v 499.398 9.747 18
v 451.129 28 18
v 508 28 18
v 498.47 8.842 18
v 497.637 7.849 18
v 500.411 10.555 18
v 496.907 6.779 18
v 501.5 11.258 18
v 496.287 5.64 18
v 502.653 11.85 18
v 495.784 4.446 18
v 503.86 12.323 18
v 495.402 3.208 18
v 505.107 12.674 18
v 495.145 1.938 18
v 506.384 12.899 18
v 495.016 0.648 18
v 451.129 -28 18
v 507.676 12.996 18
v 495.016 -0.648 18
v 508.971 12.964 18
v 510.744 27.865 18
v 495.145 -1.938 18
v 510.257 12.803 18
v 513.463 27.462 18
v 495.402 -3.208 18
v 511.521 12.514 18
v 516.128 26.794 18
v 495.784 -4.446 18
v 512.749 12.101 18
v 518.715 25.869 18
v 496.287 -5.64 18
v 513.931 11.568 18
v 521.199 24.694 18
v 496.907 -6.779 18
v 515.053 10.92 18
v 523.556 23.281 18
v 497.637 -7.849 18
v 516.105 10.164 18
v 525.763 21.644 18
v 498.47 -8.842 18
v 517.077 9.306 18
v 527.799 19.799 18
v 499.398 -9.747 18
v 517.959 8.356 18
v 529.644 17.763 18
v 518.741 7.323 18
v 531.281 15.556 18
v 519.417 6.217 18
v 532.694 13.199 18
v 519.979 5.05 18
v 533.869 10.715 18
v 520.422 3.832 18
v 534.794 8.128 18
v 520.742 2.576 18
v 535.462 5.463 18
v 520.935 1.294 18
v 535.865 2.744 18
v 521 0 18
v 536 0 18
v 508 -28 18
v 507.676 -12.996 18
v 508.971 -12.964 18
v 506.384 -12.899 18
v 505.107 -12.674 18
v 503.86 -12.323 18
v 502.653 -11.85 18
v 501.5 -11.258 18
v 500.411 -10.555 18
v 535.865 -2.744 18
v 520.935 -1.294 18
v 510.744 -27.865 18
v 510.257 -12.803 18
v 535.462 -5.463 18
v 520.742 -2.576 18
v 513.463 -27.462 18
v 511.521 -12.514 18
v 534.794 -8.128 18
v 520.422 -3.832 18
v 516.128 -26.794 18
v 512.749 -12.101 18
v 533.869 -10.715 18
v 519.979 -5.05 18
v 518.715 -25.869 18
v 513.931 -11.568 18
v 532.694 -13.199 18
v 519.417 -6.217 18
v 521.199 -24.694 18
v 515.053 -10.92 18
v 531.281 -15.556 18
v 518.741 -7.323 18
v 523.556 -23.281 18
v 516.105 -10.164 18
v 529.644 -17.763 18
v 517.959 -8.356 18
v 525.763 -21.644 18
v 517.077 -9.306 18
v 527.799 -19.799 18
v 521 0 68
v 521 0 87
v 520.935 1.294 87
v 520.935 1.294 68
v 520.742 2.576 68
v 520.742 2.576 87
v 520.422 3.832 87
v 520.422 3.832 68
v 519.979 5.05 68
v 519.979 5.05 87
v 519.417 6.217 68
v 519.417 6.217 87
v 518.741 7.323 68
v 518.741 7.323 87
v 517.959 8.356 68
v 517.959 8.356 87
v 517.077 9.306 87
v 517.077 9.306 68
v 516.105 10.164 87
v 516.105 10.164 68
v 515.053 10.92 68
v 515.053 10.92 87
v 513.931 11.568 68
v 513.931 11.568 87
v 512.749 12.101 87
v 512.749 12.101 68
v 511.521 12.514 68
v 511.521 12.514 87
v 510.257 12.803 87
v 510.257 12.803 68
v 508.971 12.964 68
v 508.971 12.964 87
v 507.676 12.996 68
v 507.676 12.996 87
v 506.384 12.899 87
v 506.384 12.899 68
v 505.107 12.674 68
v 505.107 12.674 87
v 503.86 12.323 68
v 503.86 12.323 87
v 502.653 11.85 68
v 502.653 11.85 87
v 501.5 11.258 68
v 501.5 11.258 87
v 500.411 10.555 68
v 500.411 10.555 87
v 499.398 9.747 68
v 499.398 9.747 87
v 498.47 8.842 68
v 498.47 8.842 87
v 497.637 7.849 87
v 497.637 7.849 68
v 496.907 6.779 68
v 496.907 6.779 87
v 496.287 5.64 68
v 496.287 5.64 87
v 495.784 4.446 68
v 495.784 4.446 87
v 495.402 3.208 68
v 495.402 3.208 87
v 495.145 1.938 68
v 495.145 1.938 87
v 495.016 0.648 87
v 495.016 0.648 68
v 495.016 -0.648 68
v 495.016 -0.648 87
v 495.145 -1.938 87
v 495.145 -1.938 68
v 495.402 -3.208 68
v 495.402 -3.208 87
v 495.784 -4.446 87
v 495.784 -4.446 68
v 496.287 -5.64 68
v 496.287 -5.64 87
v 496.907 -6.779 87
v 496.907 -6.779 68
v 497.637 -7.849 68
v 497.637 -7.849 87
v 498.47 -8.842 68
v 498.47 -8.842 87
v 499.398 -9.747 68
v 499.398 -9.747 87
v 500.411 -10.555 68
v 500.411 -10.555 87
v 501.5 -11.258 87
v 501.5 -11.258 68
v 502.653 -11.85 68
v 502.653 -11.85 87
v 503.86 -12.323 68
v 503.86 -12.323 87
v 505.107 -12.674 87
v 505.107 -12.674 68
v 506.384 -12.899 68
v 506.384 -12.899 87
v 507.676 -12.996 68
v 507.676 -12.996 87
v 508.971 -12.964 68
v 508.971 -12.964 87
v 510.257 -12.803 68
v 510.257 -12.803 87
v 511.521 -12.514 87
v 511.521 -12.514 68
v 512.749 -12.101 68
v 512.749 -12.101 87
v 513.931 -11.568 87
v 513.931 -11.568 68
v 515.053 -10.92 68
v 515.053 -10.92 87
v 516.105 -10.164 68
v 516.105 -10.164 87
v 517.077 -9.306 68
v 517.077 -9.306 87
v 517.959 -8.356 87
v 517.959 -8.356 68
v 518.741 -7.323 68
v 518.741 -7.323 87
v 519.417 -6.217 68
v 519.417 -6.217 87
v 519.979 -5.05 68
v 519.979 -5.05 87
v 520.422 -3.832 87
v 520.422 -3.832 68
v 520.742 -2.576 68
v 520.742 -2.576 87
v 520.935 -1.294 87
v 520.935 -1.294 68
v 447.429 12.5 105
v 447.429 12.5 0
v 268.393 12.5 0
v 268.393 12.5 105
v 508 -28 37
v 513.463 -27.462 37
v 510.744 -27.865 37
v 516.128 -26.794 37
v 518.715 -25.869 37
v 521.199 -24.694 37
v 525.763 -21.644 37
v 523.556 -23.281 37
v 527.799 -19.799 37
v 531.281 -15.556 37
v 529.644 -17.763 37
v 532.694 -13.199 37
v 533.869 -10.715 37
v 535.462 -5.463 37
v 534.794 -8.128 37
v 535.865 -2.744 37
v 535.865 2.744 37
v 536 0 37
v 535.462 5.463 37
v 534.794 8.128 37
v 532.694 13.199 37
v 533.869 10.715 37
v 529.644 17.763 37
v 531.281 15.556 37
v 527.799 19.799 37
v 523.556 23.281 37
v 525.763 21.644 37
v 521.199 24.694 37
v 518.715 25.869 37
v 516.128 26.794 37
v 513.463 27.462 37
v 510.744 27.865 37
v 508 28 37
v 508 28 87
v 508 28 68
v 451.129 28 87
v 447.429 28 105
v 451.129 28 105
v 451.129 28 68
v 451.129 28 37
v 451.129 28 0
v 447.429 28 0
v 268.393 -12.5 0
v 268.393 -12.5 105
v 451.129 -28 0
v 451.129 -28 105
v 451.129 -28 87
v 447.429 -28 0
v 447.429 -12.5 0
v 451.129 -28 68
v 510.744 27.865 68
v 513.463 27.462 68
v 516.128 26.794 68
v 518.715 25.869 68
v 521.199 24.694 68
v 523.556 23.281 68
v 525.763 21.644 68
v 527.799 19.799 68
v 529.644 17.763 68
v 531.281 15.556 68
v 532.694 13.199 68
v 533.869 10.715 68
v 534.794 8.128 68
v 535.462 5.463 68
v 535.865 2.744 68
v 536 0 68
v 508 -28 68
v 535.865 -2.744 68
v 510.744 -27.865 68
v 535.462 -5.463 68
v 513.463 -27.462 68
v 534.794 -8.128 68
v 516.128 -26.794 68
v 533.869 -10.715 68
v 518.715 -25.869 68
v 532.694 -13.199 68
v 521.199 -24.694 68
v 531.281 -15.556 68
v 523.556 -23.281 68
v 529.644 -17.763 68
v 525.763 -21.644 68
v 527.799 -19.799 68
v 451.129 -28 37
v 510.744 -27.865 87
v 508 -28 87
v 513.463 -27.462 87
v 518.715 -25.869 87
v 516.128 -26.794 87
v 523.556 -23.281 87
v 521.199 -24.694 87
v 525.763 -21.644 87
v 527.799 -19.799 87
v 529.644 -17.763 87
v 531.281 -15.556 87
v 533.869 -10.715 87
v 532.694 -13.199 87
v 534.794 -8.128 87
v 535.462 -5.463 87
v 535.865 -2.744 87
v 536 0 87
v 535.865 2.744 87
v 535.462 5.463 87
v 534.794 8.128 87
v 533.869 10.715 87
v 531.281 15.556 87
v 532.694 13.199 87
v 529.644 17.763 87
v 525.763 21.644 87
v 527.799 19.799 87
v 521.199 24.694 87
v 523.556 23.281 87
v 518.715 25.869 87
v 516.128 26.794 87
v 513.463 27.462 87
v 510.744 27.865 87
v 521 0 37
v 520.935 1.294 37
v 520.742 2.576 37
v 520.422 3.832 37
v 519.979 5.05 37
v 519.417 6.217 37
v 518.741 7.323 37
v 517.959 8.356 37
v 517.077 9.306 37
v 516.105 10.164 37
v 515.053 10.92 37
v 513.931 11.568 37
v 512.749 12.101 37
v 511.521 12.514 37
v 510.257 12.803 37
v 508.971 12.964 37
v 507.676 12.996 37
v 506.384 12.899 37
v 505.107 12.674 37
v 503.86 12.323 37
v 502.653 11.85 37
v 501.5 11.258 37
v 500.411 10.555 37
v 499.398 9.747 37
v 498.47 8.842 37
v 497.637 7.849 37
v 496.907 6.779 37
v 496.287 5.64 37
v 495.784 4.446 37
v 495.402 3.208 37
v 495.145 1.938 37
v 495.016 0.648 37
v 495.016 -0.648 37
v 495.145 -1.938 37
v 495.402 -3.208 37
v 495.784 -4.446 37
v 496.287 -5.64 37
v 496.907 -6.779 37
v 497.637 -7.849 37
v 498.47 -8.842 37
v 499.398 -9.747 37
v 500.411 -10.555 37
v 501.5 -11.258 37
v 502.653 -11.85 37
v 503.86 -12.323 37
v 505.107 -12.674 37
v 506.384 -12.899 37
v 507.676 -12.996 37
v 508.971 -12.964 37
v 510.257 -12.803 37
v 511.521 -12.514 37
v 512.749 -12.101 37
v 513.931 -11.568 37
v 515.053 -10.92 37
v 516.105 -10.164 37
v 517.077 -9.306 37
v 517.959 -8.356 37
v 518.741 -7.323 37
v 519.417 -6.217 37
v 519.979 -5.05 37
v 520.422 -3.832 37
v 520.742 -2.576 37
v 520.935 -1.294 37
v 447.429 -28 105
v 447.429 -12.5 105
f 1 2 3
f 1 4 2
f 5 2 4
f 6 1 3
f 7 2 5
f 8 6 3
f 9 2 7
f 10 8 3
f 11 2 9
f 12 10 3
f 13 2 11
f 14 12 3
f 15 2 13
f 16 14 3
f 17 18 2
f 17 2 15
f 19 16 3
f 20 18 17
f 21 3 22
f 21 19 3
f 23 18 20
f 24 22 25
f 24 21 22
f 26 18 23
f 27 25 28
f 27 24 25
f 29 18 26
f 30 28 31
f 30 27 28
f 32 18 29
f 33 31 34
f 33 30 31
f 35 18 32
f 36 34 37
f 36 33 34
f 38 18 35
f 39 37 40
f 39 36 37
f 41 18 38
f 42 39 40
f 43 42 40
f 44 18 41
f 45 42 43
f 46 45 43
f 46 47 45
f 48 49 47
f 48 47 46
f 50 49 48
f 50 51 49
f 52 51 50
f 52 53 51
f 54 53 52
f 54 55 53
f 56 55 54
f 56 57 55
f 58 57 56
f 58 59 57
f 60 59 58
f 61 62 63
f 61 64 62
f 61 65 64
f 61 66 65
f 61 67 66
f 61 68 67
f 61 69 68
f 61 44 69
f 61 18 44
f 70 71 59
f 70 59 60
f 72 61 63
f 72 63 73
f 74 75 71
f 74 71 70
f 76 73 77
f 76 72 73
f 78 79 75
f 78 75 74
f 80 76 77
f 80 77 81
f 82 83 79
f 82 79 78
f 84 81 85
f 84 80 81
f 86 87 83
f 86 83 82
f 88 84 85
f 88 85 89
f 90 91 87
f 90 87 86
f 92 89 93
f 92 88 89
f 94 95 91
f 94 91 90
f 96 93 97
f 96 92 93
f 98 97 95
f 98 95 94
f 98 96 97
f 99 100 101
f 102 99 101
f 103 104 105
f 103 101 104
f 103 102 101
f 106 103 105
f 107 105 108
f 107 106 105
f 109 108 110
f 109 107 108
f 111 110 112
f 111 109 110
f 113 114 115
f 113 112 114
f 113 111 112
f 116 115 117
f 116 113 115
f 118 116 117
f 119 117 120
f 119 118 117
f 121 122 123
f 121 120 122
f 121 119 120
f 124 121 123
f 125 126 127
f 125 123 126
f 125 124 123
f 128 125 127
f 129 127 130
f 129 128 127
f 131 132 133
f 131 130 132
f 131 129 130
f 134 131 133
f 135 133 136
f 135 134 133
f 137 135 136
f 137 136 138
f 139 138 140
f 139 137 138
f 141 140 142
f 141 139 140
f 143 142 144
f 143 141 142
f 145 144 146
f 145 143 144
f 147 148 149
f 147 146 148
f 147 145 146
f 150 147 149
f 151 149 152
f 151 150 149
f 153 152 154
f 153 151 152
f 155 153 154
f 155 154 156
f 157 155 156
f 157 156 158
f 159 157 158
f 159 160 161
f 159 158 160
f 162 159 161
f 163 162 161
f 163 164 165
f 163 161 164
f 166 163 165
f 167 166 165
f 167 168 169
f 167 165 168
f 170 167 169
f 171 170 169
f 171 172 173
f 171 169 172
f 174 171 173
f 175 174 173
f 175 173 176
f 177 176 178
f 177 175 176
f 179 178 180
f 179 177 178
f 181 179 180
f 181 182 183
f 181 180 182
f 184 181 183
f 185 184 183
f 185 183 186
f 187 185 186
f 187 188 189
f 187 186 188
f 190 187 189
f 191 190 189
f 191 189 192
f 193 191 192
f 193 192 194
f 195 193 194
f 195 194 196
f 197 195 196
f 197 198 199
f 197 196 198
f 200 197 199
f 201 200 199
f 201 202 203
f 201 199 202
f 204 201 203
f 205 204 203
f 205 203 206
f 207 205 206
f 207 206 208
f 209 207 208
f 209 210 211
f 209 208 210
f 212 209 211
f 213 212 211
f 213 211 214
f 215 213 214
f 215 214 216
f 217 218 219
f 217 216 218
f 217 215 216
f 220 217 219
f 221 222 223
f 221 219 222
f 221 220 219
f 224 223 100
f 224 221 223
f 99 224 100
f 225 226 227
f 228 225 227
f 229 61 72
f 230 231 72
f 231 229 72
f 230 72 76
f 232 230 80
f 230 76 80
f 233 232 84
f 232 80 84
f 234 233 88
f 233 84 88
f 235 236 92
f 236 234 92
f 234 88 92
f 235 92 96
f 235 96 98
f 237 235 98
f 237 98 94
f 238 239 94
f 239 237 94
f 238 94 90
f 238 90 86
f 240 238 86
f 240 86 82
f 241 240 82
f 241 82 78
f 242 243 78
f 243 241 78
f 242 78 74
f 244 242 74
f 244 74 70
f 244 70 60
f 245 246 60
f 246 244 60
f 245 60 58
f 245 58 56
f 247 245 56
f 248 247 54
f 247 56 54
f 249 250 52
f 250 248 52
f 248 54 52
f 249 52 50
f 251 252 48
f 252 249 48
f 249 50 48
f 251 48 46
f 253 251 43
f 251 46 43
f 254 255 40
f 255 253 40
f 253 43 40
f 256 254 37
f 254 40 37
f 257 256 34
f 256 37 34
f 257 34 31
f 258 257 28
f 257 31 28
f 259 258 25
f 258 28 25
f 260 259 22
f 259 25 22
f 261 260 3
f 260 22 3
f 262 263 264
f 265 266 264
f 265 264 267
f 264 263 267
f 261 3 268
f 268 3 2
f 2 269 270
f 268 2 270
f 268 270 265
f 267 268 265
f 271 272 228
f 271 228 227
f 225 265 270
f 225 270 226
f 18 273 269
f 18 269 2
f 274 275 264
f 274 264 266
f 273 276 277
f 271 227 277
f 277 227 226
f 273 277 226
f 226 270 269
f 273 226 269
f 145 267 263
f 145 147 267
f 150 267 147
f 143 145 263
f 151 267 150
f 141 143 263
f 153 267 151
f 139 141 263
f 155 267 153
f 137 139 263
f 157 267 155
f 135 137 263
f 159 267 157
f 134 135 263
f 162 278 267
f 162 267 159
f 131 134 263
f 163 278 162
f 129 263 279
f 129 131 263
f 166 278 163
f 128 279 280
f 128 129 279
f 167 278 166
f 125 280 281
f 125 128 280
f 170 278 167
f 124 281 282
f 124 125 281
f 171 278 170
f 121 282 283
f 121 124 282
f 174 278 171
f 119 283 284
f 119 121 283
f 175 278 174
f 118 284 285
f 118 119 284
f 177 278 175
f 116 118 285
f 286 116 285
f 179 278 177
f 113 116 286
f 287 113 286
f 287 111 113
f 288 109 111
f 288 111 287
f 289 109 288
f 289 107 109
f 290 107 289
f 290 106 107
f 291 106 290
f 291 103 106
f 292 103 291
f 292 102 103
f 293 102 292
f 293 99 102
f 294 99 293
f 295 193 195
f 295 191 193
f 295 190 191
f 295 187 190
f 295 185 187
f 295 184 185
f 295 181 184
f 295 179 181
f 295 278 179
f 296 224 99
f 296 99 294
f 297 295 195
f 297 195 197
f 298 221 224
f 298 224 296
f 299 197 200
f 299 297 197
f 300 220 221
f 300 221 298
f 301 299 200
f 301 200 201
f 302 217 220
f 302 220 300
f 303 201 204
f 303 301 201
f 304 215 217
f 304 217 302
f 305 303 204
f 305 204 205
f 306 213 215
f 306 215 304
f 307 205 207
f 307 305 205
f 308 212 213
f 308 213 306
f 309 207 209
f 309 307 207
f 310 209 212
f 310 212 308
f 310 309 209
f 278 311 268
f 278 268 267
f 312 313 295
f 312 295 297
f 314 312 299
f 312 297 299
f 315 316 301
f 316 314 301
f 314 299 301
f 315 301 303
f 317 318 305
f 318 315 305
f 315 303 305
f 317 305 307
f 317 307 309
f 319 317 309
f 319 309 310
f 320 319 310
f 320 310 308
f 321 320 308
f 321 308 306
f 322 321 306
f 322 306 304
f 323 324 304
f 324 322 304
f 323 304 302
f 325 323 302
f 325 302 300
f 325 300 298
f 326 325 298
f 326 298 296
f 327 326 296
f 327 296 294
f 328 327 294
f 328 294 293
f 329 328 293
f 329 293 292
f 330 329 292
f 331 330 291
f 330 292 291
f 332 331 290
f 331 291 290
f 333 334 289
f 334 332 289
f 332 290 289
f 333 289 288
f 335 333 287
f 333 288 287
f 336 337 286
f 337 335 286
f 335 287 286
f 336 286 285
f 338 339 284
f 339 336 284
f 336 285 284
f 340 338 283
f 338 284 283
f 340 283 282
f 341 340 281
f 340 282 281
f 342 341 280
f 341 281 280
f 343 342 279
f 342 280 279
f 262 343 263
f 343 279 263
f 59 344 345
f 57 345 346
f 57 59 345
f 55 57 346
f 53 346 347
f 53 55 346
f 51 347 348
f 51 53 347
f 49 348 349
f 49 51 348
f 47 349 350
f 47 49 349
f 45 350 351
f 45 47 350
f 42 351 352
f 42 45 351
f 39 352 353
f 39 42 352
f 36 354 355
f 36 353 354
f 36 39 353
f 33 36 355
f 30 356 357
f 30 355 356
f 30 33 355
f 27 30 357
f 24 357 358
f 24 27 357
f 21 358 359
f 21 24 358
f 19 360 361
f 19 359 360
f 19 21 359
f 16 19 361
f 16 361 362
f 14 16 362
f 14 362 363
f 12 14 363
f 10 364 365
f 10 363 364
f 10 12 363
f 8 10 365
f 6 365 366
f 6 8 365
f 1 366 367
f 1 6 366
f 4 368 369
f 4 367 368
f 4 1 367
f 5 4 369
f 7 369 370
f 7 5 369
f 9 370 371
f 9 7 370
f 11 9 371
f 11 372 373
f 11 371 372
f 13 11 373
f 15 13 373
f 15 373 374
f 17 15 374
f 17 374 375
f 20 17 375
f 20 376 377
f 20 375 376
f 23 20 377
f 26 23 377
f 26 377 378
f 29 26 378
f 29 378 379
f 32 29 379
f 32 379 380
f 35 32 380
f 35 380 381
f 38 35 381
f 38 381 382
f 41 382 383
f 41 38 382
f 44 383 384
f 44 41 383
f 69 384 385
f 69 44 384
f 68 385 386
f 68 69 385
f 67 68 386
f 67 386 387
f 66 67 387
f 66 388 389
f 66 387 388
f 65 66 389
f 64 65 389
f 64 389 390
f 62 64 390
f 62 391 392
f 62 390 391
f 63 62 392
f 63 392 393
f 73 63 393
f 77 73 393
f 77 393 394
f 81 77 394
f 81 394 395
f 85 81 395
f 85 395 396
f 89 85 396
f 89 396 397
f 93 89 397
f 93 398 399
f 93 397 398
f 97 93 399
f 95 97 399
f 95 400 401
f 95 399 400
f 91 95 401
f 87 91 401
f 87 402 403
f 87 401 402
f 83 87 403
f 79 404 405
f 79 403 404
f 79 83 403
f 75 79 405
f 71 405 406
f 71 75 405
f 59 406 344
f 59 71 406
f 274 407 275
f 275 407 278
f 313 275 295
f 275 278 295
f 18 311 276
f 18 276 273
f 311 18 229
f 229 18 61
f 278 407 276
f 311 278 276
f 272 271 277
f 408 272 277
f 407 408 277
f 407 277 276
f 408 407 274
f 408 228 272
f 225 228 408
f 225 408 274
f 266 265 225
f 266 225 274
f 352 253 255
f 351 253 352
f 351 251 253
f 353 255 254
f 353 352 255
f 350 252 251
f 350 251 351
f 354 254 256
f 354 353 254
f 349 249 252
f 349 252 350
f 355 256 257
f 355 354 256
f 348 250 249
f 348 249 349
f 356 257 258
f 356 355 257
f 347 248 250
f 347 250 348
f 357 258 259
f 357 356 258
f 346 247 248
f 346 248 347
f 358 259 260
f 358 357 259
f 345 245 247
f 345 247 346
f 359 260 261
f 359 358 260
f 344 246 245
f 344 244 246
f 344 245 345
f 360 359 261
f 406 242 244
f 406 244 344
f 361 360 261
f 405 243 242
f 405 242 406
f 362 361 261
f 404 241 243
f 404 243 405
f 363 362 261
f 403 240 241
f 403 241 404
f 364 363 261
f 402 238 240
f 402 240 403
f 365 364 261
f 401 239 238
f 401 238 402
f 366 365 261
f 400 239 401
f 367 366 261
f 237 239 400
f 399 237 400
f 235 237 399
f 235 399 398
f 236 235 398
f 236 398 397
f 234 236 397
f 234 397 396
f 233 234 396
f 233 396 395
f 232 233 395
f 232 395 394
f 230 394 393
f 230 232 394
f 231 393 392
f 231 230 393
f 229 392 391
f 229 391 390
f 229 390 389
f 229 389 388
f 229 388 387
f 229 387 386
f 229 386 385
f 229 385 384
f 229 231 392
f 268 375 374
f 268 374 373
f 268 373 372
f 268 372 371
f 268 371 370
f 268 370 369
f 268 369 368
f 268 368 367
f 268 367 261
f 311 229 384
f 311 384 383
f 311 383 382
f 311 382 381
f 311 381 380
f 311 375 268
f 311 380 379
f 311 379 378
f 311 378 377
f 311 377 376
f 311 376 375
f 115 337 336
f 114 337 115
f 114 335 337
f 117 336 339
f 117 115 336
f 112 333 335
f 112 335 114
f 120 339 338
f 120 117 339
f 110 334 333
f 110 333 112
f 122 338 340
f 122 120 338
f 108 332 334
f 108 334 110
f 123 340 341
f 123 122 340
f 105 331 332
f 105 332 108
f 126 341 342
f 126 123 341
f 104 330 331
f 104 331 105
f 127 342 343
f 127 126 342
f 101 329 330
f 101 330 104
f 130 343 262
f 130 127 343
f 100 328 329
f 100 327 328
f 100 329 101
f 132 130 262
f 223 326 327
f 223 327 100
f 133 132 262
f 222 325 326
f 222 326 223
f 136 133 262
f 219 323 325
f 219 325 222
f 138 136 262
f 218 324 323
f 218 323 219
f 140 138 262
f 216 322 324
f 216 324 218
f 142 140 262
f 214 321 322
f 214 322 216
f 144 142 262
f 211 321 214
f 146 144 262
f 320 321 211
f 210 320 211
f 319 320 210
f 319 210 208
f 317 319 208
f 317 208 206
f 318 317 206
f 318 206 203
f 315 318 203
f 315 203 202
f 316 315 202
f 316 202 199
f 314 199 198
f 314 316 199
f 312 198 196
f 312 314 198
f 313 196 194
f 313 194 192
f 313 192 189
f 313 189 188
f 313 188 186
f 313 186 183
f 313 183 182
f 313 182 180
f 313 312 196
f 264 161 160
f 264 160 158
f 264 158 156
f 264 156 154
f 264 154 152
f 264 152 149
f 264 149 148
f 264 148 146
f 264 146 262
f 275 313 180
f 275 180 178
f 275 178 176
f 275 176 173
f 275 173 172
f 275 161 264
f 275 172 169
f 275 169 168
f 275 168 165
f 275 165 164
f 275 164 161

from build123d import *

# Parameters (mm, degrees)
F0_R     = 13
F1_DEPTH = 105
F3_DEPTH = 52.5


with BuildPart() as f1:
    # F0 (on Top) → F1 (new body)
    with BuildSketch(Plane.XY):
        with BuildLine():
            Line((447.4289454073, -28), (508, -28))
            ThreePointArc((508, -28), (536, 0), (508, 28))
            Line((508, 28), (447.4289454073, 28))
            Line((447.4289454073, 28), (447.4289454073, 12.5))
            Line((447.4289454073, 12.5), (218.8289454073, 12.5))
            Line((218.8289454073, 12.5), (218.8289454073, -12.5))
            Line((218.8289454073, -12.5), (447.4289454073, -12.5))
            Line((447.4289454073, -12.5), (447.4289454073, -28))
        make_face()
        with Locations((508, 0)):
            Circle(F0_R, mode=Mode.SUBTRACT)
    extrude(amount=F1_DEPTH)


with BuildPart() as f3:
    # F2 (on Front) → F3 (new body, symmetric)
    with BuildSketch(Plane.XZ):
        Polygon((268.3927469848, 105), (268.3927469848, 0), (451.1286479985, 0), (451.1286479985, 18), (537.2693231227, 18), (537.2693231227, 37), (451.1286479985, 37), (451.1286479985, 68), (537.2693231227, 68), (537.2693231227, 87), (451.1286479985, 87), (451.1286479985, 105), align=None)
    extrude(amount=F3_DEPTH, both=True)


with BuildPart() as f1_1:
    add(f1.part)

    # F4: intersect F3
    add(f3.part, mode=Mode.INTERSECT)


solid = f1_1.part
